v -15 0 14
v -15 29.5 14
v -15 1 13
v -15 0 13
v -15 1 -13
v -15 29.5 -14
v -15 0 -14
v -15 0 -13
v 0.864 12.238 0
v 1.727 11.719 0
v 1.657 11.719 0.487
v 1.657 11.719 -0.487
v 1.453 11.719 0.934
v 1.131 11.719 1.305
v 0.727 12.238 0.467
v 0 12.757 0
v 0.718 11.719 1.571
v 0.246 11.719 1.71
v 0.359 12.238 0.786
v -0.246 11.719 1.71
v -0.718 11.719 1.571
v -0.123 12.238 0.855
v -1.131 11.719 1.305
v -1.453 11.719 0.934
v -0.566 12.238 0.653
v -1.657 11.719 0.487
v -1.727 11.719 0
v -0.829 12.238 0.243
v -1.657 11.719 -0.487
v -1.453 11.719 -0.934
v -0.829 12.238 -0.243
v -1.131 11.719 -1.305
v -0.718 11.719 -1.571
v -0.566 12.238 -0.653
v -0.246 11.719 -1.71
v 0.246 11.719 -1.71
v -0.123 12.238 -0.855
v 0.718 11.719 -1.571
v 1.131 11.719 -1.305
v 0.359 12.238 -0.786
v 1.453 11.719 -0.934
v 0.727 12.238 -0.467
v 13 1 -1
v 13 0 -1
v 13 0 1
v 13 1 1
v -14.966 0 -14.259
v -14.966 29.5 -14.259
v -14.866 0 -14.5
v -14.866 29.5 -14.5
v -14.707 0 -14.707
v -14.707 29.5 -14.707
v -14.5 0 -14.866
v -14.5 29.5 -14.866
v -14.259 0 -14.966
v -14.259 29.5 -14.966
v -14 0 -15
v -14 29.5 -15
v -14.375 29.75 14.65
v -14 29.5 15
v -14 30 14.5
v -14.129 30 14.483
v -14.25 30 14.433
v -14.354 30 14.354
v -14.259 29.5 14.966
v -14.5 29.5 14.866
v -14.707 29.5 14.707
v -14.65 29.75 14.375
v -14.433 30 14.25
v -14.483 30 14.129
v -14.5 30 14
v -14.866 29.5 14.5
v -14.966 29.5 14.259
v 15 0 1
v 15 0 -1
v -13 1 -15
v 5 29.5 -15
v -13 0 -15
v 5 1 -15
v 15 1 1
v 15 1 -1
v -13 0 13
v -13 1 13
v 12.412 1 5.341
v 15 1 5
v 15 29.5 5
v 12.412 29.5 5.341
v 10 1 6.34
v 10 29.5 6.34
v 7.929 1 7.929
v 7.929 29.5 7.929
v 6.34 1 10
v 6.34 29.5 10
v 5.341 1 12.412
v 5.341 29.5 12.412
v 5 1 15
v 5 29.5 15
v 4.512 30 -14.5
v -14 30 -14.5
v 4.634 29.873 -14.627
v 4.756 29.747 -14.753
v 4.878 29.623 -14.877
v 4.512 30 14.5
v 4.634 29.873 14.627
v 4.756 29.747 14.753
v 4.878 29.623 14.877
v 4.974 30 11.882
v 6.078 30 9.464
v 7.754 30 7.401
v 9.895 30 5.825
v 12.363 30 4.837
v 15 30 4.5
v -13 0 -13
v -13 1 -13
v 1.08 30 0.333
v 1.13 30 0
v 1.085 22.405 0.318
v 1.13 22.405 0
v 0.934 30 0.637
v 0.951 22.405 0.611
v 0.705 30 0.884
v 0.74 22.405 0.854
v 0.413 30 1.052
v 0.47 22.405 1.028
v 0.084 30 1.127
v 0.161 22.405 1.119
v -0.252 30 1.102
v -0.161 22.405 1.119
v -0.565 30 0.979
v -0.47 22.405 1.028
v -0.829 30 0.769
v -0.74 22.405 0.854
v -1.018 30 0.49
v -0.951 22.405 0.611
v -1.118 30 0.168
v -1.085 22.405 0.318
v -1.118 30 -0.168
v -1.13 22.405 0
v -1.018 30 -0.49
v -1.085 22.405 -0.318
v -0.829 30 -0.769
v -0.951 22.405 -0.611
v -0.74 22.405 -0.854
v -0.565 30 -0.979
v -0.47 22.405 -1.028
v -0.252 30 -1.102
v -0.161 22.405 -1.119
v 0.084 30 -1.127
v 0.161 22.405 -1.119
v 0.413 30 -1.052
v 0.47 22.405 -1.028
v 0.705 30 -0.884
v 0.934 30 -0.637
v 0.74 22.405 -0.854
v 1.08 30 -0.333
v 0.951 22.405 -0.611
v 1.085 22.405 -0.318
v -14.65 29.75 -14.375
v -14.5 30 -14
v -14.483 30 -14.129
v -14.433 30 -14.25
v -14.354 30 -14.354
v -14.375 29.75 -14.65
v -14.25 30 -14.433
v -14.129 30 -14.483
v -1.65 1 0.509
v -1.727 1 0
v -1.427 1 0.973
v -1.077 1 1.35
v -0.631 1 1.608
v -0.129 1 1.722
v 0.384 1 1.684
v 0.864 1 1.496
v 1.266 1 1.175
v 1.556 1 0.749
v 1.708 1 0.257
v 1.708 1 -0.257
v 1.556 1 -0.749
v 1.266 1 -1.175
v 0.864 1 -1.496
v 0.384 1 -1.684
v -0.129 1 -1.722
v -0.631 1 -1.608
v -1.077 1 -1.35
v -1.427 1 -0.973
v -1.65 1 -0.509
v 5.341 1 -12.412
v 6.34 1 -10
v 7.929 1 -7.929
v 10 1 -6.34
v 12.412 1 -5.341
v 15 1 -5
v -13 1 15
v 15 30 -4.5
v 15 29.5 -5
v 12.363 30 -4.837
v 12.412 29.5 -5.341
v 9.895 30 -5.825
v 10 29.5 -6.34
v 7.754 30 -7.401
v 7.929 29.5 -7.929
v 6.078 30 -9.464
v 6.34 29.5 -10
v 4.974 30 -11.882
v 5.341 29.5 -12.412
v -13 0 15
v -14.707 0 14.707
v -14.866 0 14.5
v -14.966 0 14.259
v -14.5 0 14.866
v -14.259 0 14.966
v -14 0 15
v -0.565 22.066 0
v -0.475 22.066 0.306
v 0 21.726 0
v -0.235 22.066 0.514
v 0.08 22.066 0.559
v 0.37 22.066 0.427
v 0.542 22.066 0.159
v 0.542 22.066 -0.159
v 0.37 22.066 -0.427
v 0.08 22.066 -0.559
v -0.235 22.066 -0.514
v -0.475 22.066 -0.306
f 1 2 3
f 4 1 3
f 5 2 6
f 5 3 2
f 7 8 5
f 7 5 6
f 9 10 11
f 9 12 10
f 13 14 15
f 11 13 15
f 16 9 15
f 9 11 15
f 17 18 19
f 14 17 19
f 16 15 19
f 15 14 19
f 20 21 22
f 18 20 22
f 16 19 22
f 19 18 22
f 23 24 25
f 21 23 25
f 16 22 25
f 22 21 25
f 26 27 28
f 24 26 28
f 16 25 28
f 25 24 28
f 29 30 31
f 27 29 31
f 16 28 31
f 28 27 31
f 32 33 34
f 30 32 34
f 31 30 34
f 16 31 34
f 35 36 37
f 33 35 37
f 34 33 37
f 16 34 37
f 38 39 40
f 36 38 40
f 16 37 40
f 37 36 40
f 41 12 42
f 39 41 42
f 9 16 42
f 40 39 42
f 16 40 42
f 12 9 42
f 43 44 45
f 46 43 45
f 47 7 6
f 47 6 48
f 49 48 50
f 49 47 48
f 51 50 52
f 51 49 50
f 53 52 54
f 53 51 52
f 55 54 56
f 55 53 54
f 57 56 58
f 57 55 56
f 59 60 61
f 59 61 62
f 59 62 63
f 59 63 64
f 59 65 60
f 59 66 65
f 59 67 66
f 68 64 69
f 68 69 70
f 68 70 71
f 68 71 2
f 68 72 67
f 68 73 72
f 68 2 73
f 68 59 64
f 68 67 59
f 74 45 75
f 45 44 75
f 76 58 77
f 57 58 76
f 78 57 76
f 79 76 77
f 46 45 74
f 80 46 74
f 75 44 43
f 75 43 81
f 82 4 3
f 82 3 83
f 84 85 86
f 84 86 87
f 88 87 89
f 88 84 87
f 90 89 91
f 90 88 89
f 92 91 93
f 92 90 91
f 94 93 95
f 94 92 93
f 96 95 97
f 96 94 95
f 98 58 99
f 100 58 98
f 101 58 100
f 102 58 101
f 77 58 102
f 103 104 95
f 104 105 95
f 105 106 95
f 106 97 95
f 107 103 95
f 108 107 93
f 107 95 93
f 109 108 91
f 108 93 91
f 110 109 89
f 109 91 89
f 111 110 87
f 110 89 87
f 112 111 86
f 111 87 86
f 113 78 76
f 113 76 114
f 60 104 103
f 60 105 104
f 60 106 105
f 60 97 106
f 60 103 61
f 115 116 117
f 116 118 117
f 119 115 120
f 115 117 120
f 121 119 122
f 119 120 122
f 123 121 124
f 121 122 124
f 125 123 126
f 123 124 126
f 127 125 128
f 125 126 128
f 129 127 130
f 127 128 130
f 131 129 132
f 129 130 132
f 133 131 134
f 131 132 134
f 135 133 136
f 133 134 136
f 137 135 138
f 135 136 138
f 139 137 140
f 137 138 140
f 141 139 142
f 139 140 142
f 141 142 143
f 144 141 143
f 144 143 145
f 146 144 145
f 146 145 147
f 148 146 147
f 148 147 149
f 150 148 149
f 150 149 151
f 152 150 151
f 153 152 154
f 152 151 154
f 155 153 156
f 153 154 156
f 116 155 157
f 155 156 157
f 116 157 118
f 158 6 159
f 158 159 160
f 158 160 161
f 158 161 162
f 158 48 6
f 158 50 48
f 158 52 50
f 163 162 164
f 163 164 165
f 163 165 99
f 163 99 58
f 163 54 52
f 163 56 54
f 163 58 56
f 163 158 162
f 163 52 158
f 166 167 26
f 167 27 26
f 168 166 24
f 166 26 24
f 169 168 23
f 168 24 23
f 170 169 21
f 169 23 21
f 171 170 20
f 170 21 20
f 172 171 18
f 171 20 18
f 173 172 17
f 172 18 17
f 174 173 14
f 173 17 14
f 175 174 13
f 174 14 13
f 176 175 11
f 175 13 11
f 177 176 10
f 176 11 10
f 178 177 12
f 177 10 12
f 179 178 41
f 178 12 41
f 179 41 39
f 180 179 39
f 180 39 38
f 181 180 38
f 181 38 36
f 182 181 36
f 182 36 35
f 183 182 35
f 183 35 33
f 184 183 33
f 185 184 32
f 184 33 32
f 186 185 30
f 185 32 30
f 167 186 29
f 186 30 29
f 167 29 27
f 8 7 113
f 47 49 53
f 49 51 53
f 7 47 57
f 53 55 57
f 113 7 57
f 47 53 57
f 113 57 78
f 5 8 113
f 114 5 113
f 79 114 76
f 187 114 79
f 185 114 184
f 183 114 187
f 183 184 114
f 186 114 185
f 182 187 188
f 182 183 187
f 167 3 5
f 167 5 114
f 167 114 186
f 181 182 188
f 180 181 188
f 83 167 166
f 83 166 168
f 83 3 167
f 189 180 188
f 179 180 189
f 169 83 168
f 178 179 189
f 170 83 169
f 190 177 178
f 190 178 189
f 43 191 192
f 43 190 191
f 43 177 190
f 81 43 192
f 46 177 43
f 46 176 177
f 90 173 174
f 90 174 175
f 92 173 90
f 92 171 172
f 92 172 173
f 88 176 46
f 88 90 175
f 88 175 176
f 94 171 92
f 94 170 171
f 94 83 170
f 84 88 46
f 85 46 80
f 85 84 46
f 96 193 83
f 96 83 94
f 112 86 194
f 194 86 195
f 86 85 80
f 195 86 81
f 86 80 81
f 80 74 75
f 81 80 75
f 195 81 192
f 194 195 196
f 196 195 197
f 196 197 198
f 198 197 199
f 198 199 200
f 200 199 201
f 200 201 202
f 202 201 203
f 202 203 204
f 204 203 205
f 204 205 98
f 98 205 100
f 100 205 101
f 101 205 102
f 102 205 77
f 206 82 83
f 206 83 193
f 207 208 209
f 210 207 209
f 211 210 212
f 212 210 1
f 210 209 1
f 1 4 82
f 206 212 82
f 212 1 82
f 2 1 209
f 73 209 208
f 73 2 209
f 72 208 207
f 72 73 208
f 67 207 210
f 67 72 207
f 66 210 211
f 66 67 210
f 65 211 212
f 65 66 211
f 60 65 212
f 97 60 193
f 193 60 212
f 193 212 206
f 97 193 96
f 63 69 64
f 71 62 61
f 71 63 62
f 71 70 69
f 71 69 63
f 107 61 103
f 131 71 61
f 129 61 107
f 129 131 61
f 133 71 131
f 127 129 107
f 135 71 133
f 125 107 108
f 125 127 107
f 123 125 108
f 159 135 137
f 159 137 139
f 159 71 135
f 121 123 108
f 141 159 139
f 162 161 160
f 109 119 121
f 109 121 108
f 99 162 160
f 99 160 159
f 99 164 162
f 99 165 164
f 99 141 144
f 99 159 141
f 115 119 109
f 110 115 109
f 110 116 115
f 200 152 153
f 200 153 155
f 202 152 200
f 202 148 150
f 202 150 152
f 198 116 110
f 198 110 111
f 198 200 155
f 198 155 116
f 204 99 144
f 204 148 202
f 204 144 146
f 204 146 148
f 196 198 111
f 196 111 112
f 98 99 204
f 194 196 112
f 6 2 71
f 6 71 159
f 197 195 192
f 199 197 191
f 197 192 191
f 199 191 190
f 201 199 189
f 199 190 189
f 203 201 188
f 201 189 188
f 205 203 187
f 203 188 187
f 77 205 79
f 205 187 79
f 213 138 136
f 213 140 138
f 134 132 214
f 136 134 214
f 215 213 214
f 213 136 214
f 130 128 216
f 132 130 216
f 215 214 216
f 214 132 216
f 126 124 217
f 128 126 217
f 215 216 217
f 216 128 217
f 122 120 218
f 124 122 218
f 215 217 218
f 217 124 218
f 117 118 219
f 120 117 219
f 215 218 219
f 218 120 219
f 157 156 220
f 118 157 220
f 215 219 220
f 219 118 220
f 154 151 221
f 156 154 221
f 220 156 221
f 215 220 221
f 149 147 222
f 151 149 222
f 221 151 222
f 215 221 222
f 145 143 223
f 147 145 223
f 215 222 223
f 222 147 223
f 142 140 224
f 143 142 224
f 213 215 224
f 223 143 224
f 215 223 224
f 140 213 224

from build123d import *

# Parameters (mm, degrees)
SKETCH1_W                 = 30
SKETCH1_H                 = 30
BOSS_EXTRUDE1_DEPTH       = 30
CUT_EXTRUDE1_START        = -31
CUT_EXTRUDE1_DEPTH        = 32
SKETCH3_OUTSIDE_W         = 42.392
SKETCH3_OUTSIDE_H         = 42.392
SKETCH3_OUTSIDE_W_2       = 2
SKETCH3_OUTSIDE_H_2       = 2
CUT_EXTRUDE2_DEPTH        = 1
F_8_32_TAPPED_HOLE1_D     = 3.4544
F_8_32_TAPPED_HOLE1_DEPTH = 10.7188
F_8_32_TAPPED_HOLE1_TIP   = 1.037806461
F_4_40_TAPPED_HOLE1_D     = 2.2606
F_4_40_TAPPED_HOLE1_DEPTH = 7.5946
F_4_40_TAPPED_HOLE1_TIP   = 0.679152758
FILLET1_R                 = 1.000000032
CHAMFER1_SIZE             = 0.5


with BuildPart() as part:
    # Sketch1 → Boss-Extrude1 (new body)
    with BuildSketch(Plane(origin=(0, 0, 0), x_dir=(1, 0, 0), z_dir=(0, 1, 0))):
        Rectangle(SKETCH1_W, SKETCH1_H)
    extrude(amount=BOSS_EXTRUDE1_DEPTH)

    # Sketch2 → Cut-Extrude1 (cut)
    with BuildSketch(Plane(origin=(0, 30, 0), x_dir=(1, 0, 0), z_dir=(0, 1, 0)).offset(CUT_EXTRUDE1_START)):
        with BuildLine():
            Line((97.111025509, 5), (15, 5))
            ThreePointArc((15, 5), (7.928932188, 7.928932188), (5, 15))
            Line((5, 15), (5, 97.111025509))
            Line((5, 97.111025509), (121.122525896, 213.233551405))
            Line((121.122525896, 213.233551405), (213.233551405, 121.122525896))
            Line((213.233551405, 121.122525896), (97.111025509, 5))
        make_face()
    cut_extrude1 = extrude(amount=CUT_EXTRUDE1_DEPTH, mode=Mode.SUBTRACT)

    # Mirror1: Cut-Extrude1 across plane
    add(cut_extrude1.mirror(Plane.XY), mode=Mode.SUBTRACT)

    # Sketch3 outside → Cut-Extrude2 (cut)
    with BuildSketch(Plane.XZ):
        Rectangle(SKETCH3_OUTSIDE_W, SKETCH3_OUTSIDE_H)
        with Locations((-14, 14)):
            Rectangle(SKETCH3_OUTSIDE_W_2, SKETCH3_OUTSIDE_H_2, mode=Mode.SUBTRACT)
        with Locations((-14, -14)):
            Rectangle(SKETCH3_OUTSIDE_W_2, SKETCH3_OUTSIDE_H_2, mode=Mode.SUBTRACT)
        with Locations((14, 0)):
            Rectangle(SKETCH3_OUTSIDE_W_2, SKETCH3_OUTSIDE_H_2, mode=Mode.SUBTRACT)
    extrude(amount=-CUT_EXTRUDE2_DEPTH, mode=Mode.SUBTRACT)

    # #8-32 Tapped Hole1
    with Locations(Plane.XZ.offset(-1)):
        with Locations((0, 0)):
            Hole(F_8_32_TAPPED_HOLE1_D / 2, depth=F_8_32_TAPPED_HOLE1_DEPTH)
            with Locations((0, 0, -(F_8_32_TAPPED_HOLE1_DEPTH + F_8_32_TAPPED_HOLE1_TIP / 2))):  # 118° drill point
                Cone(0, F_8_32_TAPPED_HOLE1_D / 2, F_8_32_TAPPED_HOLE1_TIP, mode=Mode.SUBTRACT)

    # #4-40 Tapped Hole1
    with Locations(Plane(origin=(0, 30, 0), x_dir=(-1, 0, 0), z_dir=(0, 1, 0))):
        with Locations((0, 0)):
            Hole(F_4_40_TAPPED_HOLE1_D / 2, depth=F_4_40_TAPPED_HOLE1_DEPTH)
            with Locations((0, 0, -(F_4_40_TAPPED_HOLE1_DEPTH + F_4_40_TAPPED_HOLE1_TIP / 2))):  # 118° drill point
                Cone(0, F_4_40_TAPPED_HOLE1_D / 2, F_4_40_TAPPED_HOLE1_TIP, mode=Mode.SUBTRACT)

    # Fillet1
    fillet1_edges = [part.edges().sort_by_distance(p)[0] for p in [
        (-15, 15, 15),
        (-15, 15, -15),
    ]]
    fillet(fillet1_edges, radius=FILLET1_R)

    # Chamfer1
    chamfer1_edges = [part.edges().sort_by_distance(p)[0] for p in [
        (-14.707106772, 30, -14.707106772),
        (-14.707106772, 30, 14.707106772),
        (-4.499999984, 30, -15),
        (7.928932188, 30, -7.928932188),
        (7.928932188, 30, 7.928932188),
        (-4.499999984, 30, 15),
        (-15, 30, 0),
    ]]
    chamfer(chamfer1_edges, length=CHAMFER1_SIZE)


solid = part.part
